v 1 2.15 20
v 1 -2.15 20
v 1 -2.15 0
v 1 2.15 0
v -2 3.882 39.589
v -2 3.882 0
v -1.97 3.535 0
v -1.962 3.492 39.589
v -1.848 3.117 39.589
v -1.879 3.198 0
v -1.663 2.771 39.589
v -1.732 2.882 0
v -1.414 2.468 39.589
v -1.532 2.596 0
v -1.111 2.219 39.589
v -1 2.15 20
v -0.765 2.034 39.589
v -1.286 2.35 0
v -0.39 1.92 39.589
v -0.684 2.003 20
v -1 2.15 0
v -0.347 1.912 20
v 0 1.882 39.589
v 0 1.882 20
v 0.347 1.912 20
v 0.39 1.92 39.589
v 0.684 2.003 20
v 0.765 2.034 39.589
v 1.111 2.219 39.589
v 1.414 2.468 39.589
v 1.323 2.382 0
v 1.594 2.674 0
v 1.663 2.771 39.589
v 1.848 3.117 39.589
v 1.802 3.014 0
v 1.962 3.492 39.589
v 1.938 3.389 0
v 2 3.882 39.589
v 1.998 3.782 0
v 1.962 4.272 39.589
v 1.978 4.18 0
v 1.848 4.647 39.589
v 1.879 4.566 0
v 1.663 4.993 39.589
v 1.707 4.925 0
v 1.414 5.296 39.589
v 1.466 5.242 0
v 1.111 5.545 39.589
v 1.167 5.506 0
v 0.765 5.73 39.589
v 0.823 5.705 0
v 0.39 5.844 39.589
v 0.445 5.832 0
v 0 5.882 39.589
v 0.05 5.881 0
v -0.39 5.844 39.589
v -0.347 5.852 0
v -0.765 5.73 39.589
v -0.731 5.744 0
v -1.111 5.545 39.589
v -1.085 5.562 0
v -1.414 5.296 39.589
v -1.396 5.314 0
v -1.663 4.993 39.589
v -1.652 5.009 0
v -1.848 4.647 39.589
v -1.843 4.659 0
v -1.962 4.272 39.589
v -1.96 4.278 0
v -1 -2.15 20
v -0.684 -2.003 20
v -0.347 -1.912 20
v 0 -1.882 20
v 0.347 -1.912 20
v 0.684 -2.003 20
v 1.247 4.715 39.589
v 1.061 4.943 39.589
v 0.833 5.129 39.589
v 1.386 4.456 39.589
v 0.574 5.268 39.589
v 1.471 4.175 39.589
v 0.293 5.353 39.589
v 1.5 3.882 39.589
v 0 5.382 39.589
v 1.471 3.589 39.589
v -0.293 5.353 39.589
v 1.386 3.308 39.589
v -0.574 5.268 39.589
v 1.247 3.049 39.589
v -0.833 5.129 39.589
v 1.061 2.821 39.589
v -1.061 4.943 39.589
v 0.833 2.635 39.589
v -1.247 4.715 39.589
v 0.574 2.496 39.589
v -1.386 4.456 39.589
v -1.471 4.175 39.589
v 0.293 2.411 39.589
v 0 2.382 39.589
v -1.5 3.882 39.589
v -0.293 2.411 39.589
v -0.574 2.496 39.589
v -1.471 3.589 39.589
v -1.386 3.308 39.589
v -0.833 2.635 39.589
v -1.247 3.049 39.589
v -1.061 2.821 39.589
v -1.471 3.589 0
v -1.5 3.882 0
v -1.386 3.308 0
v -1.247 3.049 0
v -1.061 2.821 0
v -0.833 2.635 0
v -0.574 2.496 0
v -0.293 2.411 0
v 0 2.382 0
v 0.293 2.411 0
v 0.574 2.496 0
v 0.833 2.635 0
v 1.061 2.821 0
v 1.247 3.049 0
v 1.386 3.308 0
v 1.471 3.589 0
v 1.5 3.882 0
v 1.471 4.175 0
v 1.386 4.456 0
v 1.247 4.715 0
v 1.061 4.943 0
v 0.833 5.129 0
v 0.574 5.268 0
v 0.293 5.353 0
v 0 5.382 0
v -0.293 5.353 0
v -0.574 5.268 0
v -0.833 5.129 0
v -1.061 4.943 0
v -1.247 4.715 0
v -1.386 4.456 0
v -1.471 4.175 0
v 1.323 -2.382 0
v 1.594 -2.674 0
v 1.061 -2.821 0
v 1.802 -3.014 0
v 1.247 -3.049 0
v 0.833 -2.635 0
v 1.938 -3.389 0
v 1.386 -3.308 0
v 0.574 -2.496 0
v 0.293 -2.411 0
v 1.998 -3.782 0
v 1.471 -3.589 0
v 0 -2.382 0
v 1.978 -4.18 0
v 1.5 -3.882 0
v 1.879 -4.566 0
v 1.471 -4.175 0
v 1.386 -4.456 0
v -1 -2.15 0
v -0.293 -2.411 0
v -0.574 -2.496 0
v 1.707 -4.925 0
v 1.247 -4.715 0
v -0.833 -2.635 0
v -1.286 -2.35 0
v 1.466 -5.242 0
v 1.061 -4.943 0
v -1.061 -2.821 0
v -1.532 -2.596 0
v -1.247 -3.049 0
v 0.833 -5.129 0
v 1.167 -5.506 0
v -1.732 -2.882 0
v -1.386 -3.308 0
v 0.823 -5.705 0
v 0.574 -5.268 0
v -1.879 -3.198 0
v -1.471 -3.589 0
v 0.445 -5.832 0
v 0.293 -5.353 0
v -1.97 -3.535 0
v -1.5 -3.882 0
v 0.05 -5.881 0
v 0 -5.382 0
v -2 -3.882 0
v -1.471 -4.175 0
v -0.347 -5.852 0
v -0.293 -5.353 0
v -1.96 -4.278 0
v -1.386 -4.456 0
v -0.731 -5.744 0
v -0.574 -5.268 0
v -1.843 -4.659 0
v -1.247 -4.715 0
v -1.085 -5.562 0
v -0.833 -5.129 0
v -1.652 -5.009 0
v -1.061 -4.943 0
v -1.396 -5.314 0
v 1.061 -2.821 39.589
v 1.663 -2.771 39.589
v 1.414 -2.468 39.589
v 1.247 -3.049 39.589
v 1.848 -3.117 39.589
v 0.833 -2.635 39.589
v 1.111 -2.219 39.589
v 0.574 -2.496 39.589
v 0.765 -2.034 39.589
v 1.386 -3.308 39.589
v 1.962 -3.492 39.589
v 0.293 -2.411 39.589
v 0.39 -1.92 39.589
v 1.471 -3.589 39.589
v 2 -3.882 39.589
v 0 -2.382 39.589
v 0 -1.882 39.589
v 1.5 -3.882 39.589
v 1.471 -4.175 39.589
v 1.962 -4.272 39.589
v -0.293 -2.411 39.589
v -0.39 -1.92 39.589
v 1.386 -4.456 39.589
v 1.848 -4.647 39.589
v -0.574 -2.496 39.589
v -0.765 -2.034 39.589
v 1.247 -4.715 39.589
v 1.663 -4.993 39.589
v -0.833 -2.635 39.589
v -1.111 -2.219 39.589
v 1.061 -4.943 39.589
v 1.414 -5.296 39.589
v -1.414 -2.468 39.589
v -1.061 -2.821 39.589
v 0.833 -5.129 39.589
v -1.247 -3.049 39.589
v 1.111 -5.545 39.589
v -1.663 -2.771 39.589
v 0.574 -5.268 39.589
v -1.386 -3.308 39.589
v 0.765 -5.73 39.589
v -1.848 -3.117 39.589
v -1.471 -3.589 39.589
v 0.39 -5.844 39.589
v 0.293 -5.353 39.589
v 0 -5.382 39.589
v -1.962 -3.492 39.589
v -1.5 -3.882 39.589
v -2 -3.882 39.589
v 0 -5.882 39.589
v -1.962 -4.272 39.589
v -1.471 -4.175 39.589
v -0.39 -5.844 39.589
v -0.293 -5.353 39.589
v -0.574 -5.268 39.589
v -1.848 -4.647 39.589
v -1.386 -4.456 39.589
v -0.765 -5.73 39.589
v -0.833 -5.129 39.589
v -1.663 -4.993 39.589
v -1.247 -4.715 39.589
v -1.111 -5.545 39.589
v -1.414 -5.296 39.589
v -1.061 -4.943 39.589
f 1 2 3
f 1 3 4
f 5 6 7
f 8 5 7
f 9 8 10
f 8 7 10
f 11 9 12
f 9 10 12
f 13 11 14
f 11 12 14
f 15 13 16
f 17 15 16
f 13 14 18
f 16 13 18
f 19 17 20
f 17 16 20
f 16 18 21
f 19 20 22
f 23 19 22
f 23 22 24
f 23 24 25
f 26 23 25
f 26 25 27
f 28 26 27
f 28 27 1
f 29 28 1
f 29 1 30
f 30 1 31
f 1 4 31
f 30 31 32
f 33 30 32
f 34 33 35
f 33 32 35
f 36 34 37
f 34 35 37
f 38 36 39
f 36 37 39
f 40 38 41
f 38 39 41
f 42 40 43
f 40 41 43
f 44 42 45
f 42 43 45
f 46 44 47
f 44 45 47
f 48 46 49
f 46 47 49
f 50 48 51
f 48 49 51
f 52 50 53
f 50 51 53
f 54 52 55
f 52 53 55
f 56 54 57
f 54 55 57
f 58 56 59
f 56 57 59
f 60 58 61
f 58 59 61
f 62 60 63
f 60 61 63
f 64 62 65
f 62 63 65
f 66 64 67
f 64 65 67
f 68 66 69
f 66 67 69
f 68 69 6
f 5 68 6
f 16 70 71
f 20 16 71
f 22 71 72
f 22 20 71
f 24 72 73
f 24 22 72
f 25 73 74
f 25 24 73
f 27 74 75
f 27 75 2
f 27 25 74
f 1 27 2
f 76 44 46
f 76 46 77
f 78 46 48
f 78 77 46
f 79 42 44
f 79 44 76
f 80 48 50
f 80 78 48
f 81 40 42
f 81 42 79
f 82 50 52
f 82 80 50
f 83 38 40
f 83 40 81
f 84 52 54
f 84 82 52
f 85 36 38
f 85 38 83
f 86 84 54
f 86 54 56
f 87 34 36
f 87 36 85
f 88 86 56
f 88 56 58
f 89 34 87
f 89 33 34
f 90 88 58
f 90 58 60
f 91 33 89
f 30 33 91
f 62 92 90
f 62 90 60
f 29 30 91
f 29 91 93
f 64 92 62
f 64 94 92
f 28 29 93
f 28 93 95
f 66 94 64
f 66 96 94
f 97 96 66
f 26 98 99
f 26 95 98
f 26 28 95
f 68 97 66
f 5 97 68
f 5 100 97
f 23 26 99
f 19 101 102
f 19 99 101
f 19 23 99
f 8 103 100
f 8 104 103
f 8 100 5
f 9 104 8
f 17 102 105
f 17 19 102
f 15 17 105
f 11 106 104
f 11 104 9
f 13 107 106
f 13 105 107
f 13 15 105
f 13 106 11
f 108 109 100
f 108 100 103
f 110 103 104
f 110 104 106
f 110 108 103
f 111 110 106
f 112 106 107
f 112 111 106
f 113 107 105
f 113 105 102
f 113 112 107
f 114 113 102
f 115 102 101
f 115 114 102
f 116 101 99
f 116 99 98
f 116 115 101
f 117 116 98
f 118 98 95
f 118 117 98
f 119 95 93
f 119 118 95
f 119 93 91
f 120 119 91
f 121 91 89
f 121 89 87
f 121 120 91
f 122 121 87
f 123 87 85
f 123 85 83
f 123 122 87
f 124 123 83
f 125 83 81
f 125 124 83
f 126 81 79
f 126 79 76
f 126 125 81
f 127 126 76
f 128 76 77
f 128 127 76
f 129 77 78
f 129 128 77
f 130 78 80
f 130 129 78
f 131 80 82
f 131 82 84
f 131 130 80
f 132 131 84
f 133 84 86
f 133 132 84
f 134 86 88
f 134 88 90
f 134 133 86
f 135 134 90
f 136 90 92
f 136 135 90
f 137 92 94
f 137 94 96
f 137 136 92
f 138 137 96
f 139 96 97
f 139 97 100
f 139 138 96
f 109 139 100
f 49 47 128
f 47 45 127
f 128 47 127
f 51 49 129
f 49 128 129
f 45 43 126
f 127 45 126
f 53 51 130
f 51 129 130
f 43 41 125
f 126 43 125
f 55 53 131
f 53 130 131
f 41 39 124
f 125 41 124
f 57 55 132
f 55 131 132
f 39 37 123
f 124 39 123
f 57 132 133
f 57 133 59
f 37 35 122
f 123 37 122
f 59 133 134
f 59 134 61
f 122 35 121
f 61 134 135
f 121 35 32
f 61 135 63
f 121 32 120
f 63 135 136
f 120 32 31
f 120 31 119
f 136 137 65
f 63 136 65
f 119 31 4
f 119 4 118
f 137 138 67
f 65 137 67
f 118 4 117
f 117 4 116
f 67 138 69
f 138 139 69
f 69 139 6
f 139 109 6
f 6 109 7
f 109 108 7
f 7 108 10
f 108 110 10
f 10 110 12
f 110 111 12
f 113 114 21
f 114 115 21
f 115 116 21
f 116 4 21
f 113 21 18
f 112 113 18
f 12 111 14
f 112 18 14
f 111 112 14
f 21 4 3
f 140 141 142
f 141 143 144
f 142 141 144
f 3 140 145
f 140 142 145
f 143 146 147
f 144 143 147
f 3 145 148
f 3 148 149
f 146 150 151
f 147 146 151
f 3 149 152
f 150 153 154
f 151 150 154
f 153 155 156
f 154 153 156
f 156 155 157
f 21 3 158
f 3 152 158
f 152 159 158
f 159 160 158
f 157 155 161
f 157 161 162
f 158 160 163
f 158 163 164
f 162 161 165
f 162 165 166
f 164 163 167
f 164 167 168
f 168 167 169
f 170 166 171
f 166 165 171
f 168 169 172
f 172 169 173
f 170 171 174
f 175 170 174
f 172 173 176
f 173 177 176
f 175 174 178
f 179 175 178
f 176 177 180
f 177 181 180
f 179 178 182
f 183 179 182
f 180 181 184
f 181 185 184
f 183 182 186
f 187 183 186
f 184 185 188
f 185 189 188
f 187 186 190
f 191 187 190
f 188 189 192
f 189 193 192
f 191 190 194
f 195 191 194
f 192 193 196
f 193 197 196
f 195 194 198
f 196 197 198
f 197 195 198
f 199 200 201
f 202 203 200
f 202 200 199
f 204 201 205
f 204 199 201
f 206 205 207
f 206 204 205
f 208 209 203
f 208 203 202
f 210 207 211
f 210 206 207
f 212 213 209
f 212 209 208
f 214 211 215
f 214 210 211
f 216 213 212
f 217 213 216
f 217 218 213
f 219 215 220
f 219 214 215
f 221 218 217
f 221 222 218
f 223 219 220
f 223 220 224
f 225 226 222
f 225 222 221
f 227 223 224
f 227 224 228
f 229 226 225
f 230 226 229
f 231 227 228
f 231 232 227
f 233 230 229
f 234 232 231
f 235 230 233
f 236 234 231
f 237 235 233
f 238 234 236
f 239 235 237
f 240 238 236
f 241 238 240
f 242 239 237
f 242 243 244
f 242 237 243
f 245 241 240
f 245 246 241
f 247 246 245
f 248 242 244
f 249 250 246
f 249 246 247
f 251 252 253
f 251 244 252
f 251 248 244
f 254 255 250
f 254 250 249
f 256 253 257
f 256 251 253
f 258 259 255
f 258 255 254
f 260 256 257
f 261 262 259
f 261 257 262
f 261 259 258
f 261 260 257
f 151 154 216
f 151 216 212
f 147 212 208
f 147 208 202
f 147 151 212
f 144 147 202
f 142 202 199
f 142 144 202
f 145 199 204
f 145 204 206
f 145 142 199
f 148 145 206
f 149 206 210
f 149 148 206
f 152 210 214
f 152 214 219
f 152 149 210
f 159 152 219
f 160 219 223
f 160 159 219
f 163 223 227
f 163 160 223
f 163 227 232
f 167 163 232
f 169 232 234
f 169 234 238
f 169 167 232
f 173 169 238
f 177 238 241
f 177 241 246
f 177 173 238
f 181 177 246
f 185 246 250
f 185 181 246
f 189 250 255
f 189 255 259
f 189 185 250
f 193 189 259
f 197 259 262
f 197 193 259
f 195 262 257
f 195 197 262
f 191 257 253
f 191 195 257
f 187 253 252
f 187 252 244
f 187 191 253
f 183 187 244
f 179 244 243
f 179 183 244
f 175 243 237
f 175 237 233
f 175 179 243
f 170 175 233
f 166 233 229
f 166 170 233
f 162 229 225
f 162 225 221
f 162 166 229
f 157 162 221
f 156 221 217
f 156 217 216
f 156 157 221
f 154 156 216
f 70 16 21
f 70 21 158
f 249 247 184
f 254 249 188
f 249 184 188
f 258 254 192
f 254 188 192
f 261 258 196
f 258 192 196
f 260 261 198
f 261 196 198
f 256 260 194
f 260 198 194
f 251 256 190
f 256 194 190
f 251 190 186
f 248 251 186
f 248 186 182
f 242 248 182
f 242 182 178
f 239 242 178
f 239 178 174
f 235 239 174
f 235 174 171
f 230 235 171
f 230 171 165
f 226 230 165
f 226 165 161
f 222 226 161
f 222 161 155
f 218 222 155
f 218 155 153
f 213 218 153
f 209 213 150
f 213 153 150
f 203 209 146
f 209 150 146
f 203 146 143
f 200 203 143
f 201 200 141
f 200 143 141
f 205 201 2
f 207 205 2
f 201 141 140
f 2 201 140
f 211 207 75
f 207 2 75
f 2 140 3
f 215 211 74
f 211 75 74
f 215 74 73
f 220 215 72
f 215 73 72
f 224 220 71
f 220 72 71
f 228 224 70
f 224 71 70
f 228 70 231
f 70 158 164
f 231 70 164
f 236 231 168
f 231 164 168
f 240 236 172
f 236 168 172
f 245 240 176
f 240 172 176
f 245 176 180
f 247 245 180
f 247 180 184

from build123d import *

# Parameters (mm, degrees)
ESQUISSE1_R          = 2
ESQUISSE1_R_2        = 1.5
BOSS_EXTRU_1_DEPTH   = 39.58852
BOSS_EXTRU_1_2_DEPTH = 39.58852
BOSS_EXTRU_2_DEPTH   = 20


with BuildPart() as part:
    # Esquisse1 → Boss.-Extru.1 (new body)
    with BuildSketch(Plane.XY):
        with Locations(Location((0, 3.882050808, 0), (0, 0, 180))):
            Circle(ESQUISSE1_R)
        with Locations(Location((0, 3.882050808, 0), (0, 0, 180))):
            Circle(ESQUISSE1_R_2, mode=Mode.SUBTRACT)
    extrude(amount=BOSS_EXTRU_1_DEPTH)



with BuildPart() as body_2:
    # Esquisse1 → Boss.-Extru.1 2 (new body)
    with BuildSketch(Plane.XY):
        with Locations(Location((0, -3.882050808, 0), (0, 0, 180))):
            Circle(ESQUISSE1_R)
        with Locations((0, -3.882050808)):
            Circle(ESQUISSE1_R_2, mode=Mode.SUBTRACT)
    extrude(amount=BOSS_EXTRU_1_2_DEPTH)


with BuildPart() as part_1:
    add(part.part)

    add(body_2.part)  # Boss.-Extru.2 merges body 2
    # Esquisse1<3> → Boss.-Extru.2 (add)
    with BuildSketch(Plane.XY):
        with BuildLine():
            ThreePointArc((-1, -2.15), (0, -1.882050808), (1, -2.15))
            Line((1, -2.15), (1, 2.15))
            ThreePointArc((1, 2.15), (0, 1.882050808), (-1, 2.15))
            Line((-1, 2.15), (-1, -2.15))
        make_face()
    extrude(amount=BOSS_EXTRU_2_DEPTH)


solid = part_1.part
